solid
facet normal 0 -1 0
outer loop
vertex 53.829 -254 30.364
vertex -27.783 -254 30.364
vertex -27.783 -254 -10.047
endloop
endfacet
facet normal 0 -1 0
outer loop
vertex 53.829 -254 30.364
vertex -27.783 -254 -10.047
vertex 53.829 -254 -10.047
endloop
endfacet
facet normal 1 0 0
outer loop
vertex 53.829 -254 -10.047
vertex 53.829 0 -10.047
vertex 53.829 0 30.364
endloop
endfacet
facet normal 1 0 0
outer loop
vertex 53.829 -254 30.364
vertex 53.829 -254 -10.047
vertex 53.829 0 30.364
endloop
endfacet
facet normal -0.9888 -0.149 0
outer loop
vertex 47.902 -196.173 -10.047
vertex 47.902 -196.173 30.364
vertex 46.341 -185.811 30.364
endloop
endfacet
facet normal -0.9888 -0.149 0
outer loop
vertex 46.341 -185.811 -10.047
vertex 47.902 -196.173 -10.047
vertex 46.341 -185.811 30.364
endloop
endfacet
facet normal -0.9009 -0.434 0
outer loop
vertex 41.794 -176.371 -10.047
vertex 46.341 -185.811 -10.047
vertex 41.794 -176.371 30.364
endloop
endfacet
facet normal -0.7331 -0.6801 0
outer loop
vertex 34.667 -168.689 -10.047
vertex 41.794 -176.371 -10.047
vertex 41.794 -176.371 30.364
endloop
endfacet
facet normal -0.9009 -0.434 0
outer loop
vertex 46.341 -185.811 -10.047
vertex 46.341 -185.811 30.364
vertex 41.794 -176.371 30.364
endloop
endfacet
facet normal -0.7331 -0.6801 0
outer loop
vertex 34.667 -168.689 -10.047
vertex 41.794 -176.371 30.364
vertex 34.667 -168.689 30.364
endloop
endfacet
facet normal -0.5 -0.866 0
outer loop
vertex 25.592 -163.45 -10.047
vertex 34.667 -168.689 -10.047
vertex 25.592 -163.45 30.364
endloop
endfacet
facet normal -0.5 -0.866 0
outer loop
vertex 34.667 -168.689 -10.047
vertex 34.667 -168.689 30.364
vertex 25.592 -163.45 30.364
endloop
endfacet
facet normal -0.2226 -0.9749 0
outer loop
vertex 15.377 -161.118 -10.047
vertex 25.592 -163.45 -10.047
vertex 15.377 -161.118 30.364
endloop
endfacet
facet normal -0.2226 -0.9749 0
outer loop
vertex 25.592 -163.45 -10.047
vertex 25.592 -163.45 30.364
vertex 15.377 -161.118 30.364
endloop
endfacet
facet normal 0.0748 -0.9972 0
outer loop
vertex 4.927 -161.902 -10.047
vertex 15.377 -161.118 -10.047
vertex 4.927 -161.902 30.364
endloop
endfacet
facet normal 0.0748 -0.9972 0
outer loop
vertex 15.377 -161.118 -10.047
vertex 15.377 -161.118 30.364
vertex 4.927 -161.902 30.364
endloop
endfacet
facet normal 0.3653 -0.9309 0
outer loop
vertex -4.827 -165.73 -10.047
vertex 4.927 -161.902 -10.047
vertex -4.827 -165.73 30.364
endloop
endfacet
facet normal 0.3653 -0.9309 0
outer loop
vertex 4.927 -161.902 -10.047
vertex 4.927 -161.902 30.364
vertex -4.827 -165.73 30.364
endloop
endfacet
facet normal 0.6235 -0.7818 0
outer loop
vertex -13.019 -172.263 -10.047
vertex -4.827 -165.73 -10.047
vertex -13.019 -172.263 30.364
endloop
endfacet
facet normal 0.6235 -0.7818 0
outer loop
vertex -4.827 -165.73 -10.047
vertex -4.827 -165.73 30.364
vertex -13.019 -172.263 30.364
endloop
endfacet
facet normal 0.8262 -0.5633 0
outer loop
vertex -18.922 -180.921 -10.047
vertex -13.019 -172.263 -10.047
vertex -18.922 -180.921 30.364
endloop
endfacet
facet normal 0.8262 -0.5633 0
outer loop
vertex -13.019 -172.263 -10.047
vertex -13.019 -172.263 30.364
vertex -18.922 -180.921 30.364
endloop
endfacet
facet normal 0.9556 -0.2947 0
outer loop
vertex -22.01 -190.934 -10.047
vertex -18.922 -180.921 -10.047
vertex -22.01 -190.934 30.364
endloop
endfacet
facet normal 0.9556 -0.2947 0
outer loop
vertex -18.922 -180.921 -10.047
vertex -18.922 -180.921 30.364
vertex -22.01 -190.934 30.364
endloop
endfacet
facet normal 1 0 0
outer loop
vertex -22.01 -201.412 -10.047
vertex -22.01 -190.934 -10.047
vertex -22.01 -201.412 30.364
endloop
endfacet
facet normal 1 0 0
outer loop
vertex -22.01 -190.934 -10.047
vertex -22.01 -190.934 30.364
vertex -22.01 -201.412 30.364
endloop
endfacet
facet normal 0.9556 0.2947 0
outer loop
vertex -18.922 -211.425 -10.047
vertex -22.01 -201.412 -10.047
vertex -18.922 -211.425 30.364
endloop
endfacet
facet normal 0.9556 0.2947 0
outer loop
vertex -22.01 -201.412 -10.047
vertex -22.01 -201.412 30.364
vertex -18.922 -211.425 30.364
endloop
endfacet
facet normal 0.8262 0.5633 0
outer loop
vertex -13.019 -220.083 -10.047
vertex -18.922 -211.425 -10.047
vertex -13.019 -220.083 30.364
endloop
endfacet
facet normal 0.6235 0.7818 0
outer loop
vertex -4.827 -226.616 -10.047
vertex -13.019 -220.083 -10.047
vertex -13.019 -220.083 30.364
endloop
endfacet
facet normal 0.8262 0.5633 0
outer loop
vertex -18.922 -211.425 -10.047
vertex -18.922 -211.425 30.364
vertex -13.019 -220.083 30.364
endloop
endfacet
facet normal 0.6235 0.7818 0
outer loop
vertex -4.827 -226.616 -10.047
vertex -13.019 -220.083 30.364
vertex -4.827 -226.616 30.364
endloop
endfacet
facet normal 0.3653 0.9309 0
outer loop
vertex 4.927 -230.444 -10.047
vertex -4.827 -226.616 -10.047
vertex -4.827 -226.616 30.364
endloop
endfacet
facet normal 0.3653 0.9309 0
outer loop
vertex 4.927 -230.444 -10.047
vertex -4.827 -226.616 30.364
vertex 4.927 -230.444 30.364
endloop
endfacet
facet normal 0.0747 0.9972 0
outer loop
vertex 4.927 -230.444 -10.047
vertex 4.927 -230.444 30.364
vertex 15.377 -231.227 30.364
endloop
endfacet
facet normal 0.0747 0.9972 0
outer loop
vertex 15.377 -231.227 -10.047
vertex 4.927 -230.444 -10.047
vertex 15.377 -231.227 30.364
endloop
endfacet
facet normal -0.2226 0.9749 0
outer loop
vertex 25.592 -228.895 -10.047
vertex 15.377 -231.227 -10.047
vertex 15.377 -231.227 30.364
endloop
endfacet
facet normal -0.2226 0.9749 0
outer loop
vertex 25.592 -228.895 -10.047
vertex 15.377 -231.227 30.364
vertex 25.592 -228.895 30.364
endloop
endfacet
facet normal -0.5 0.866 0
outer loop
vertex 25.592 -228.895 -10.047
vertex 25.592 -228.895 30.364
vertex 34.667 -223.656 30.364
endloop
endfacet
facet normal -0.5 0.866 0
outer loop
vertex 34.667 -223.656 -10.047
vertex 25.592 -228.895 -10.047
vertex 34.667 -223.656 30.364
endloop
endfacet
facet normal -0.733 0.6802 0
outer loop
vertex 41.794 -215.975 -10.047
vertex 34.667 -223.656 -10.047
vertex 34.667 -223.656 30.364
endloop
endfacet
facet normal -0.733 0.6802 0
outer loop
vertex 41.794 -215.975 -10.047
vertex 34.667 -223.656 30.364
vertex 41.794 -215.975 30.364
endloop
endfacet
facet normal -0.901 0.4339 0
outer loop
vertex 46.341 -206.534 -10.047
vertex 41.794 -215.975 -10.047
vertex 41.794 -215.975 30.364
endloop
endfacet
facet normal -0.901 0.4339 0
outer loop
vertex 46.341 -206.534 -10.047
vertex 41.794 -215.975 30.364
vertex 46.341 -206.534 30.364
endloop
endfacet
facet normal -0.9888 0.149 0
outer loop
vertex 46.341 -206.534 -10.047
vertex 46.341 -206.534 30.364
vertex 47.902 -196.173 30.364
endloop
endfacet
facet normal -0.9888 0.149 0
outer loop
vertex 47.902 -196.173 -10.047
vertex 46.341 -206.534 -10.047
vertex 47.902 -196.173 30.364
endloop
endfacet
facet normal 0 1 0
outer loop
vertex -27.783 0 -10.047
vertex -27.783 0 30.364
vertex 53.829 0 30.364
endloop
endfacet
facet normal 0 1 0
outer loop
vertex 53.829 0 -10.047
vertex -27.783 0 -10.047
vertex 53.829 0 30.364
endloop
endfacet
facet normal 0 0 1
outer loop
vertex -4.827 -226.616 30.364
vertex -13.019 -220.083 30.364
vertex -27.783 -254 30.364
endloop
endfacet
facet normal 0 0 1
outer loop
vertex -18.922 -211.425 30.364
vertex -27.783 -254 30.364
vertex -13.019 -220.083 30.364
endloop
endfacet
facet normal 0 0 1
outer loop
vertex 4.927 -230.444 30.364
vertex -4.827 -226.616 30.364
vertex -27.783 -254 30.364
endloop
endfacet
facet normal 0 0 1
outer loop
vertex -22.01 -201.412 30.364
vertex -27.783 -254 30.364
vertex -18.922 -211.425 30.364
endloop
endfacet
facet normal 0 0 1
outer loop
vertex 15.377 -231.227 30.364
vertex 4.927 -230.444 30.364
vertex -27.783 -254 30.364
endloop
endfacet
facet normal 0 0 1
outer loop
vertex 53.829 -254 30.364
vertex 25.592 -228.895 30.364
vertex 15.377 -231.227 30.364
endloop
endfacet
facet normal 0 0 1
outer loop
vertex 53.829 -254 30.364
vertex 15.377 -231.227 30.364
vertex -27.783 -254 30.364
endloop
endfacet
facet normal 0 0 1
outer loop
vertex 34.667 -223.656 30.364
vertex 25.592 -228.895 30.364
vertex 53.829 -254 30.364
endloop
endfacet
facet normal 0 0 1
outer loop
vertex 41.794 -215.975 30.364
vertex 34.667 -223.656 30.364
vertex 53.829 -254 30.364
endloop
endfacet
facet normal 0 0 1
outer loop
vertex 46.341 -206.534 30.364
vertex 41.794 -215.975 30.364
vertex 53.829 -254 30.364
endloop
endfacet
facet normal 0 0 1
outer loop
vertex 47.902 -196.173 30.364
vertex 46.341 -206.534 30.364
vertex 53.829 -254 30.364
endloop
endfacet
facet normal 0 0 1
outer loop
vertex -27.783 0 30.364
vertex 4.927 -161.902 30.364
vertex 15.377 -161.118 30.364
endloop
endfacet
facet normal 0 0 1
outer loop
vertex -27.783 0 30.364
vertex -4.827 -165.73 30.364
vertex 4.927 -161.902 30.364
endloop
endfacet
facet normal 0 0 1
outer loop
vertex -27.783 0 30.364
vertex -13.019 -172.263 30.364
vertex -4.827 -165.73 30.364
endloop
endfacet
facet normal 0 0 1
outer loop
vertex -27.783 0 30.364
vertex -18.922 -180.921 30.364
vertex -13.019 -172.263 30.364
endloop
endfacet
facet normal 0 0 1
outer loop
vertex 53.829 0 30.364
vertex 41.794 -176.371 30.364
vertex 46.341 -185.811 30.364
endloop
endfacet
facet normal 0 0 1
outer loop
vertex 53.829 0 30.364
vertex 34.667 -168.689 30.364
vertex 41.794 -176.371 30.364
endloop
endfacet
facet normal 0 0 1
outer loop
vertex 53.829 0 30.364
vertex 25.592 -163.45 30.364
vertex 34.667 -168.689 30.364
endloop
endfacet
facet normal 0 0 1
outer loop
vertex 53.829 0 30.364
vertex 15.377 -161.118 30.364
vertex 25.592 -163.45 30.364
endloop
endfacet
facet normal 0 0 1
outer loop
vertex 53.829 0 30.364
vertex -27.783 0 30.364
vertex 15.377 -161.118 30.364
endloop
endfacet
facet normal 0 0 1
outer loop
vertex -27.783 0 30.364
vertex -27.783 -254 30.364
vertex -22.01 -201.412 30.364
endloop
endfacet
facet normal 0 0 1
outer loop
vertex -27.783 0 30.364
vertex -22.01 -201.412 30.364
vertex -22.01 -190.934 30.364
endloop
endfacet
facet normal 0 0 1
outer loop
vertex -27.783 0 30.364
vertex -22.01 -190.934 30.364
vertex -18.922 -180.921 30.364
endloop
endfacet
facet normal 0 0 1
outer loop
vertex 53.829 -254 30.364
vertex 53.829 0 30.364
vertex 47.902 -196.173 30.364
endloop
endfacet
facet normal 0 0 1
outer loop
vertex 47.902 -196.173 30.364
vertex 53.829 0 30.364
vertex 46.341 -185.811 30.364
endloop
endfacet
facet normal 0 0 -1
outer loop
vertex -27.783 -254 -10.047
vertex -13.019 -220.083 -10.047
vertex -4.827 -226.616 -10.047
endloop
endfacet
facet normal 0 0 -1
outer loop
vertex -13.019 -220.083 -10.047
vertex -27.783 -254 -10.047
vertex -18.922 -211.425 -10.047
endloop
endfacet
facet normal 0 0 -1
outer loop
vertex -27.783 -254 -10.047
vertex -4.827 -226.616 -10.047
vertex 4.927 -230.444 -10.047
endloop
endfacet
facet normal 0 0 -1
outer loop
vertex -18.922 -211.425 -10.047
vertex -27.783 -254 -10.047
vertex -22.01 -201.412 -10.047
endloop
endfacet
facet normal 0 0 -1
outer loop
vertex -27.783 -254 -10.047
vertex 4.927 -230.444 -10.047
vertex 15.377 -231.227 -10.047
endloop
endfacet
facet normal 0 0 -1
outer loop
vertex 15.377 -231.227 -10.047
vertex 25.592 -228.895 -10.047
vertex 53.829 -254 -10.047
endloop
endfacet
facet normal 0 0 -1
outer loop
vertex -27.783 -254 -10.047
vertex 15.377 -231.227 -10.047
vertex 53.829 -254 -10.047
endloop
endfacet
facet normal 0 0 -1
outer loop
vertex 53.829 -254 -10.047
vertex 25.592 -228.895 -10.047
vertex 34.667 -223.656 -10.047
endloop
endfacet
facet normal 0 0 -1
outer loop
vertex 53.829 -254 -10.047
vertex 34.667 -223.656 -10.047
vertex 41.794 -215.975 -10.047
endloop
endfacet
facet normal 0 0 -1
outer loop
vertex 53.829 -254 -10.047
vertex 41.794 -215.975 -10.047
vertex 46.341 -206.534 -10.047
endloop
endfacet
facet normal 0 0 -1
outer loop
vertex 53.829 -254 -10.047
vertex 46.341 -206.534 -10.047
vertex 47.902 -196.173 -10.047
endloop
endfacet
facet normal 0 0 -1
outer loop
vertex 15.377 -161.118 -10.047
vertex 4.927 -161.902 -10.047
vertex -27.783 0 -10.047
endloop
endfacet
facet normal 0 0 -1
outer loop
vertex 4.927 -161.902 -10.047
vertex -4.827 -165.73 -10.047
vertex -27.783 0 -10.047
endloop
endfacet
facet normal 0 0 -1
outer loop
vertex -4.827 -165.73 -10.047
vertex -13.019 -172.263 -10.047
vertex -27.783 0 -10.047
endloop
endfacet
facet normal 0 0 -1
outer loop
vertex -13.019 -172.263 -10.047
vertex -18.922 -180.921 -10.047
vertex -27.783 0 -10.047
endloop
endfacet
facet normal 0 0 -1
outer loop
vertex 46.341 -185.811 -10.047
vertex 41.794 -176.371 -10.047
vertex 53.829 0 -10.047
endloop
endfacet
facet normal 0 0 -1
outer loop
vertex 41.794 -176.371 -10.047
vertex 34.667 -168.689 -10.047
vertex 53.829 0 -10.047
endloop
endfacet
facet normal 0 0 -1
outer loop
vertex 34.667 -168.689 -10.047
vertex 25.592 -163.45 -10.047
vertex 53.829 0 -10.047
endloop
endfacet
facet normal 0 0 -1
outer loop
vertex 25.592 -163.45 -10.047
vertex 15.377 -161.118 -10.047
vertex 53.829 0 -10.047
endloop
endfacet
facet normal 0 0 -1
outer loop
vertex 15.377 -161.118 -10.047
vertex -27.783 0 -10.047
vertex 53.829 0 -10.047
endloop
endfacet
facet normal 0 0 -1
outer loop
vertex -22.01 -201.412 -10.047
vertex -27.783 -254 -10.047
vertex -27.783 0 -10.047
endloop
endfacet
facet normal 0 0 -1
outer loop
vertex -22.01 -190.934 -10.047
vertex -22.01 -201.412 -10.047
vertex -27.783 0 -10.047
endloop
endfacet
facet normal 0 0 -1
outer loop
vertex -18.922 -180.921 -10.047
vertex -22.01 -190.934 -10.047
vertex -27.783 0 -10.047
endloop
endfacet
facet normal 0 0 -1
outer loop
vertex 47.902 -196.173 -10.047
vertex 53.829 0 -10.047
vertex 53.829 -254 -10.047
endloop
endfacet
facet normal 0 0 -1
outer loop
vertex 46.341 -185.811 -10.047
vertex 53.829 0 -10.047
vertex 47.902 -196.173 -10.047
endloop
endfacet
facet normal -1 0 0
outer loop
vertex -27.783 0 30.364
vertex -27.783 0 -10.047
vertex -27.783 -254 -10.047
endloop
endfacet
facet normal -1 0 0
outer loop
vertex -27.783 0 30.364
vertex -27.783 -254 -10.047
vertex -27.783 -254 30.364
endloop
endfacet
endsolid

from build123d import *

# Parameters (mm, degrees)
F0_W     = 81.611588
F0_H     = 40.411144
F1_DEPTH = 254
F2_R     = 35.152573
F3_DEPTH = 254


with BuildPart() as f1:
    # F0 (on Front) → F1 (new body)
    with BuildSketch(Plane.XZ):
        with Locations((13.023123, 10.158926)):
            Rectangle(F0_W, F0_H)
    extrude(amount=F1_DEPTH)

    # F2 (on face) → F3 (cut)
    with BuildSketch(Plane.XY.offset(30.364498)):
        with Locations((12.749678, -196.172729)):
            Circle(F2_R)
    extrude(amount=-F3_DEPTH, mode=Mode.SUBTRACT)


solid = f1.part
